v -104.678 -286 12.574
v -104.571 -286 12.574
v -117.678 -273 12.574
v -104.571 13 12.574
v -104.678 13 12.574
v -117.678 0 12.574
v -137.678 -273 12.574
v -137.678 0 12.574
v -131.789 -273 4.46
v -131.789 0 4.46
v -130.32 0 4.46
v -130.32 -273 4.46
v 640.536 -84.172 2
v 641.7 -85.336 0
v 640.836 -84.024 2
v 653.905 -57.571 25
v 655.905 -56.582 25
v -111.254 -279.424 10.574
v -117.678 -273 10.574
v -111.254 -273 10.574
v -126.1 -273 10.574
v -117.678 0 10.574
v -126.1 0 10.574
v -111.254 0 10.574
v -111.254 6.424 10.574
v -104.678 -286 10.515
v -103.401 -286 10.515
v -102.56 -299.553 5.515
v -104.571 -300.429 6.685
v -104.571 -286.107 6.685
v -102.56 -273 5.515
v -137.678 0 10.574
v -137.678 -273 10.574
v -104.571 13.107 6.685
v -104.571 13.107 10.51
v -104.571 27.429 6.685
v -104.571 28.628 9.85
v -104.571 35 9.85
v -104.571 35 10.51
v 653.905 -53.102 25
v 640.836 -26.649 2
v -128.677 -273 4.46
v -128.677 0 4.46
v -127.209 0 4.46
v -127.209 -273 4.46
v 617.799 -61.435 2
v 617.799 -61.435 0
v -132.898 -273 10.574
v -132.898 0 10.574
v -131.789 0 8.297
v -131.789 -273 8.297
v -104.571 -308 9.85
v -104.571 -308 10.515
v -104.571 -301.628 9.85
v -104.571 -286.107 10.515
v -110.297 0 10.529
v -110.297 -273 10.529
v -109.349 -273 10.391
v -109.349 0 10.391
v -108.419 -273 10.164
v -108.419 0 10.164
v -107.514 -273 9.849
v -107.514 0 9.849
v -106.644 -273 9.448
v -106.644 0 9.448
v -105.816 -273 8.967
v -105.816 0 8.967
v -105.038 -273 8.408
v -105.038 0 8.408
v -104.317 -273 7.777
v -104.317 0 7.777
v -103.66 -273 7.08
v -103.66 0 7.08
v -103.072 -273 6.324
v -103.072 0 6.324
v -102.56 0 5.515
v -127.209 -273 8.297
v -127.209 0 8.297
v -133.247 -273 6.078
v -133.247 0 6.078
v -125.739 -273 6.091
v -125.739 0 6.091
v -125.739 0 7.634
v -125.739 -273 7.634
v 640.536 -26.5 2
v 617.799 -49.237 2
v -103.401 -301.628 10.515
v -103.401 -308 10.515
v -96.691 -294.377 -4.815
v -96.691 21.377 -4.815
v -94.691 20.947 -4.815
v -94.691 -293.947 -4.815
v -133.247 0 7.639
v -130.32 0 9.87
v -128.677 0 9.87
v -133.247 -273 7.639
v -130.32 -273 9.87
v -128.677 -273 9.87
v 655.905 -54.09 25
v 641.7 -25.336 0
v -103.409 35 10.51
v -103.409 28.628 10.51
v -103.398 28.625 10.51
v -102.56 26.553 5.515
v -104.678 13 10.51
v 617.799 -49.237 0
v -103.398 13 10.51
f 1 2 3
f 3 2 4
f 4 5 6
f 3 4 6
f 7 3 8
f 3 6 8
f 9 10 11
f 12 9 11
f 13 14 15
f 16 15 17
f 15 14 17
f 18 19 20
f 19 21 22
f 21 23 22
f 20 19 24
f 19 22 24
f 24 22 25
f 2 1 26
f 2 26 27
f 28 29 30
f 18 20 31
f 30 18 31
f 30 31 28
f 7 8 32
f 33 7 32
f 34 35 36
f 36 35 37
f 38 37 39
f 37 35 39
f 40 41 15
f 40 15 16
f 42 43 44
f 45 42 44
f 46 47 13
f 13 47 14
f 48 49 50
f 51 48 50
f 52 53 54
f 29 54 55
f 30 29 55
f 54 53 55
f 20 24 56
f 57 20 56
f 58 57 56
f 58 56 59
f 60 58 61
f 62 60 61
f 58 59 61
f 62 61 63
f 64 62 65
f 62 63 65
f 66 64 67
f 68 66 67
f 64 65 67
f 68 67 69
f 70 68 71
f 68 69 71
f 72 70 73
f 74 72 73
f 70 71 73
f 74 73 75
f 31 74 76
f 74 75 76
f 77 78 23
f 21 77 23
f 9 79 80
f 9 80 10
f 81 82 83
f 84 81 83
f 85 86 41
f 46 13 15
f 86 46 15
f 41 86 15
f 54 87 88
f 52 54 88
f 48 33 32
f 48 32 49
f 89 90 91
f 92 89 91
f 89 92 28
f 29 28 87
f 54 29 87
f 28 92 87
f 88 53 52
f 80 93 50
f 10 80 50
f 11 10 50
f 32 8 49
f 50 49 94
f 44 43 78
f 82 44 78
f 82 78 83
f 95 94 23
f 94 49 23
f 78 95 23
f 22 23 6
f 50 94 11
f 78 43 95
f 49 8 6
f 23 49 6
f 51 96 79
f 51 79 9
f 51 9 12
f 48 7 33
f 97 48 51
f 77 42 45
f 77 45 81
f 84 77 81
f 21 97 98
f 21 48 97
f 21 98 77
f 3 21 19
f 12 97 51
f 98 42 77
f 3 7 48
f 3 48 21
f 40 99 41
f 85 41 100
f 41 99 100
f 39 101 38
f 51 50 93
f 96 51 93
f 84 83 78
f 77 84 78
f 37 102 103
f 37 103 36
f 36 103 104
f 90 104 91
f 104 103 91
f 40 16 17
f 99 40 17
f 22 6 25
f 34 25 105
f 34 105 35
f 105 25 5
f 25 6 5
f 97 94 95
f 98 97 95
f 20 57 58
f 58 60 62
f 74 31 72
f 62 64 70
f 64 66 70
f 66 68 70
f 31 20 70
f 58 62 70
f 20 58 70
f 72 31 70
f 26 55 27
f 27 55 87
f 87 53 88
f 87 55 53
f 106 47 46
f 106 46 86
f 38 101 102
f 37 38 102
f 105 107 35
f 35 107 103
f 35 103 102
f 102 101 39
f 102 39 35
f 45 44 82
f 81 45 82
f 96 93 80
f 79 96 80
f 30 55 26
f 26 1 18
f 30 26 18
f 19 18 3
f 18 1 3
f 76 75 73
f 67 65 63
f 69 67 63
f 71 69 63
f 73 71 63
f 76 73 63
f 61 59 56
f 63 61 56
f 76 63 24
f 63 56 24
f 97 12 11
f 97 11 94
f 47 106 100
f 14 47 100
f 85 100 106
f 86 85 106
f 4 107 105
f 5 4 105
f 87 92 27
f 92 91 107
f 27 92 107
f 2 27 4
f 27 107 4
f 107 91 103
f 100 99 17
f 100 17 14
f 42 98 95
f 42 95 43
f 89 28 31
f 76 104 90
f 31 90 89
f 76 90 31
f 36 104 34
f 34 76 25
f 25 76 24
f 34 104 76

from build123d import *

# Parameters (mm, degrees)
F1_DEPTH  = 273
F2_W      = 60
F2_H      = 60
F3_DEPTH  = 25
F5_DEPTH  = 60
F7_DEPTH  = 25
F9_DEPTH  = 25
F11_DEPTH = 35
F13_DEPTH = 35
F15_DEPTH = 25
F16_W     = 34.7940474749
F16_H     = 10.6428852305
F17_DEPTH = 22
F18_W     = 28.127618134
F18_H     = 8.1855747849
F19_DEPTH = 22
F21_DEPTH = 25


with BuildPart() as f1:
    # F0 (on Front) → F1 (new body)
    with BuildSketch(Plane.XZ):
        with BuildLine():
            Line((-133.2470553492, 7.6385764419), (-133.2470553492, 6.0782490816))
            Line((-133.2470553492, 6.0782490816), (-131.7889272934, 4.4600827154))
            Line((-131.7889272934, 4.4600827154), (-130.3201019764, 4.4600827154))
            Line((-130.3201019764, 4.4600827154), (-130.3201019764, 9.8700057715))
            Line((-130.3201019764, 9.8700057715), (-129.4987696921, 9.8700057715))
            Line((-129.4987696921, 9.8700057715), (-128.6774374079, 9.8700057715))
            Line((-128.6774374079, 9.8700057715), (-128.6774374079, 4.4600827154))
            Line((-128.6774374079, 4.4600827154), (-127.2086120909, 4.4600827154))
            Line((-127.2086120909, 4.4600827154), (-125.7392460887, 6.09072046))
            Line((-125.7392460887, 6.09072046), (-125.7392460887, 7.6335056603))
            Line((-125.7392460887, 7.6335056603), (-127.2086120909, 8.2965123933))
            Line((-127.2086120909, 8.2965123933), (-126.099644159, 10.5743914377))
            Line((-126.099644159, 10.5743914377), (-124.5710669784, 10.5743914377))
            Line((-124.5710669784, 10.5743914377), (-119.5710669784, 10.5743914377))
            Line((-119.5710669784, 10.5743914377), (-111.2542399217, 10.5743914377))
            ThreePointArc((-111.2542399217, 10.5743914377), (-106.2244142949, 9.2173570262), (-102.55971796, 5.5145622705))
            Line((-102.55971796, 5.5145622705), (-96.6907253127, -4.8146524857))
            Line((-96.6907253127, -4.8146524857), (-94.6907253127, -4.8146524857))
            Line((-94.6907253127, -4.8146524857), (-104.5710669784, 12.5743914377))
            Line((-104.5710669784, 12.5743914377), (-124.5710669784, 12.5743914377))
            Line((-124.5710669784, 12.5743914377), (-134.4264724059, 12.5743914377))
            Line((-134.4264724059, 12.5743914377), (-137.6779079437, 12.5743914377))
            Line((-137.6779079437, 12.5743914377), (-137.6779079437, 10.5743914377))
            Line((-137.6779079437, 10.5743914377), (-134.4264724059, 10.5743914377))
            Line((-134.4264724059, 10.5743914377), (-132.8978952253, 10.5743914377))
            Line((-132.8978952253, 10.5743914377), (-131.7889272934, 8.2965123933))
            Line((-131.7889272934, 8.2965123933), (-133.2470553492, 7.6385764419))
        make_face()
    extrude(amount=F1_DEPTH)

    # F10 (on face) → F11 (join)
    with BuildSketch(Plane(origin=(0, 0, 0), x_dir=(-1, 0, 0), z_dir=(0, 1, 0))):
        Polygon((94.6907253127, -4.8146524857), (96.6907253127, -4.8146524857), (102.55971796, 5.5145622705), (111.2542399217, 10.5743914377), (117.6779079437, 10.5743914377), (117.6779079437, 12.5743914377), (104.5710669784, 12.5743914377), align=None)
    extrude(amount=F11_DEPTH)

    # F12 (on face) → F13 (join)
    with BuildSketch(Plane.XZ.offset(273)):
        Polygon((-104.5710669784, 12.5743914377), (-117.6779079437, 12.5743914377), (-117.6779079437, 10.5743914377), (-111.2542399217, 10.5743914377), (-102.55971796, 5.5145622705), (-96.6907253127, -4.8146524857), (-94.6907253127, -4.8146524857), align=None)
    extrude(amount=F13_DEPTH)

    # F14 (on face) → F15 (cut)
    with BuildSketch(Plane.XY.offset(12.5743914377)):
        Polygon((-117.6779079437, 35), (-117.6779079437, 0), (-104.5710669784, 13.1068409653), (-104.5710669784, 35), align=None)
        Polygon((-104.5710669784, -286.1068409653), (-117.6779079437, -273), (-117.6779079437, -308), (-104.5710669784, -308), align=None)
    extrude(amount=-F15_DEPTH, mode=Mode.SUBTRACT)

    # F16 (on face) → F17 (cut)
    with BuildSketch(Plane.XZ.offset(308)):
        with Locations((-101.3436540961, 15.8364423551)):
            Rectangle(F16_W, F16_H)
    extrude(amount=-F17_DEPTH, mode=Mode.SUBTRACT)

    # F18 (on face) → F19 (cut)
    with BuildSketch(Plane(origin=(0, 35, 0), x_dir=(-1, 0, 0), z_dir=(0, 1, 0))):
        with Locations((104.8995219171, 14.603103511)):
            Rectangle(F18_W, F18_H)
    extrude(amount=-F19_DEPTH, mode=Mode.SUBTRACT)

    # F20 (on face) → F21 (cut)
    with BuildSketch(Plane(origin=(-73.6491911658, 0, -41.8469914347), x_dir=(0, 1, 0), z_dir=(0.8694521962, 0, 0.4940170833))):
        Polygon((-293.9468324184, 42.5927257556), (-301.6275167465, 60.2241174446), (-308, 60.2241174446), (-308, 42.5927257556), align=None)
        Polygon((35, 60.2241174446), (28.6275167465, 60.2241174446), (20.9468324184, 42.5927257556), (35, 42.5927257556), align=None)
    extrude(amount=-F21_DEPTH, mode=Mode.SUBTRACT)


with BuildPart() as f3:
    # F2 (on Top) → F3 (new body)
    with BuildSketch(Plane.XY):
        with Locations((647.798807621, -55.3362455964)):
            Rectangle(F2_W, F2_H)
    extrude(amount=F3_DEPTH)

    # F4 (on face) → F5 (cut)
    with BuildSketch(Plane.XZ.offset(85.3362455964)):
        Polygon((655.9048918554, 25), (641.7000293732, 0), (677.798807621, 0), (677.798807621, 25), align=None)
        Polygon((640.8364183717, 2), (653.9048918554, 25), (617.798807621, 25), (617.798807621, 2), align=None)
    extrude(amount=-F5_DEPTH, mode=Mode.SUBTRACT)

    # F6 (on face) → F7 (cut)
    with BuildSketch(Plane(origin=(0, 0, 0), x_dir=(1, 0, 0), z_dir=(0, 0, -1))):
        Polygon((617.798807621, 61.4350238442), (641.7000293732, 85.3362455964), (617.798807621, 85.3362455964), align=None)
        Polygon((617.798807621, 25.3362455964), (641.7000293732, 25.3362455964), (617.798807621, 49.2374673486), align=None)
    extrude(amount=-F7_DEPTH, mode=Mode.SUBTRACT)

    # F8 (on face) → F9 (cut)
    with BuildSketch(Plane(origin=(485.0908720963, 0, -275.6259651805), x_dir=(0, 1, 0), z_dir=(0.8694518216, 0, -0.4940177425))):
        Polygon((-54.0899952326, 345.7649494773), (-25.3362455964, 317.0111998411), (-25.3362455964, 345.7649494773), align=None)
        Polygon((-56.5824959602, 345.7649494773), (-85.3362455964, 345.7649494773), (-85.3362455964, 317.0111998411), align=None)
    extrude(amount=-F9_DEPTH, mode=Mode.SUBTRACT)


solid = Compound([f1.part, f3.part])
